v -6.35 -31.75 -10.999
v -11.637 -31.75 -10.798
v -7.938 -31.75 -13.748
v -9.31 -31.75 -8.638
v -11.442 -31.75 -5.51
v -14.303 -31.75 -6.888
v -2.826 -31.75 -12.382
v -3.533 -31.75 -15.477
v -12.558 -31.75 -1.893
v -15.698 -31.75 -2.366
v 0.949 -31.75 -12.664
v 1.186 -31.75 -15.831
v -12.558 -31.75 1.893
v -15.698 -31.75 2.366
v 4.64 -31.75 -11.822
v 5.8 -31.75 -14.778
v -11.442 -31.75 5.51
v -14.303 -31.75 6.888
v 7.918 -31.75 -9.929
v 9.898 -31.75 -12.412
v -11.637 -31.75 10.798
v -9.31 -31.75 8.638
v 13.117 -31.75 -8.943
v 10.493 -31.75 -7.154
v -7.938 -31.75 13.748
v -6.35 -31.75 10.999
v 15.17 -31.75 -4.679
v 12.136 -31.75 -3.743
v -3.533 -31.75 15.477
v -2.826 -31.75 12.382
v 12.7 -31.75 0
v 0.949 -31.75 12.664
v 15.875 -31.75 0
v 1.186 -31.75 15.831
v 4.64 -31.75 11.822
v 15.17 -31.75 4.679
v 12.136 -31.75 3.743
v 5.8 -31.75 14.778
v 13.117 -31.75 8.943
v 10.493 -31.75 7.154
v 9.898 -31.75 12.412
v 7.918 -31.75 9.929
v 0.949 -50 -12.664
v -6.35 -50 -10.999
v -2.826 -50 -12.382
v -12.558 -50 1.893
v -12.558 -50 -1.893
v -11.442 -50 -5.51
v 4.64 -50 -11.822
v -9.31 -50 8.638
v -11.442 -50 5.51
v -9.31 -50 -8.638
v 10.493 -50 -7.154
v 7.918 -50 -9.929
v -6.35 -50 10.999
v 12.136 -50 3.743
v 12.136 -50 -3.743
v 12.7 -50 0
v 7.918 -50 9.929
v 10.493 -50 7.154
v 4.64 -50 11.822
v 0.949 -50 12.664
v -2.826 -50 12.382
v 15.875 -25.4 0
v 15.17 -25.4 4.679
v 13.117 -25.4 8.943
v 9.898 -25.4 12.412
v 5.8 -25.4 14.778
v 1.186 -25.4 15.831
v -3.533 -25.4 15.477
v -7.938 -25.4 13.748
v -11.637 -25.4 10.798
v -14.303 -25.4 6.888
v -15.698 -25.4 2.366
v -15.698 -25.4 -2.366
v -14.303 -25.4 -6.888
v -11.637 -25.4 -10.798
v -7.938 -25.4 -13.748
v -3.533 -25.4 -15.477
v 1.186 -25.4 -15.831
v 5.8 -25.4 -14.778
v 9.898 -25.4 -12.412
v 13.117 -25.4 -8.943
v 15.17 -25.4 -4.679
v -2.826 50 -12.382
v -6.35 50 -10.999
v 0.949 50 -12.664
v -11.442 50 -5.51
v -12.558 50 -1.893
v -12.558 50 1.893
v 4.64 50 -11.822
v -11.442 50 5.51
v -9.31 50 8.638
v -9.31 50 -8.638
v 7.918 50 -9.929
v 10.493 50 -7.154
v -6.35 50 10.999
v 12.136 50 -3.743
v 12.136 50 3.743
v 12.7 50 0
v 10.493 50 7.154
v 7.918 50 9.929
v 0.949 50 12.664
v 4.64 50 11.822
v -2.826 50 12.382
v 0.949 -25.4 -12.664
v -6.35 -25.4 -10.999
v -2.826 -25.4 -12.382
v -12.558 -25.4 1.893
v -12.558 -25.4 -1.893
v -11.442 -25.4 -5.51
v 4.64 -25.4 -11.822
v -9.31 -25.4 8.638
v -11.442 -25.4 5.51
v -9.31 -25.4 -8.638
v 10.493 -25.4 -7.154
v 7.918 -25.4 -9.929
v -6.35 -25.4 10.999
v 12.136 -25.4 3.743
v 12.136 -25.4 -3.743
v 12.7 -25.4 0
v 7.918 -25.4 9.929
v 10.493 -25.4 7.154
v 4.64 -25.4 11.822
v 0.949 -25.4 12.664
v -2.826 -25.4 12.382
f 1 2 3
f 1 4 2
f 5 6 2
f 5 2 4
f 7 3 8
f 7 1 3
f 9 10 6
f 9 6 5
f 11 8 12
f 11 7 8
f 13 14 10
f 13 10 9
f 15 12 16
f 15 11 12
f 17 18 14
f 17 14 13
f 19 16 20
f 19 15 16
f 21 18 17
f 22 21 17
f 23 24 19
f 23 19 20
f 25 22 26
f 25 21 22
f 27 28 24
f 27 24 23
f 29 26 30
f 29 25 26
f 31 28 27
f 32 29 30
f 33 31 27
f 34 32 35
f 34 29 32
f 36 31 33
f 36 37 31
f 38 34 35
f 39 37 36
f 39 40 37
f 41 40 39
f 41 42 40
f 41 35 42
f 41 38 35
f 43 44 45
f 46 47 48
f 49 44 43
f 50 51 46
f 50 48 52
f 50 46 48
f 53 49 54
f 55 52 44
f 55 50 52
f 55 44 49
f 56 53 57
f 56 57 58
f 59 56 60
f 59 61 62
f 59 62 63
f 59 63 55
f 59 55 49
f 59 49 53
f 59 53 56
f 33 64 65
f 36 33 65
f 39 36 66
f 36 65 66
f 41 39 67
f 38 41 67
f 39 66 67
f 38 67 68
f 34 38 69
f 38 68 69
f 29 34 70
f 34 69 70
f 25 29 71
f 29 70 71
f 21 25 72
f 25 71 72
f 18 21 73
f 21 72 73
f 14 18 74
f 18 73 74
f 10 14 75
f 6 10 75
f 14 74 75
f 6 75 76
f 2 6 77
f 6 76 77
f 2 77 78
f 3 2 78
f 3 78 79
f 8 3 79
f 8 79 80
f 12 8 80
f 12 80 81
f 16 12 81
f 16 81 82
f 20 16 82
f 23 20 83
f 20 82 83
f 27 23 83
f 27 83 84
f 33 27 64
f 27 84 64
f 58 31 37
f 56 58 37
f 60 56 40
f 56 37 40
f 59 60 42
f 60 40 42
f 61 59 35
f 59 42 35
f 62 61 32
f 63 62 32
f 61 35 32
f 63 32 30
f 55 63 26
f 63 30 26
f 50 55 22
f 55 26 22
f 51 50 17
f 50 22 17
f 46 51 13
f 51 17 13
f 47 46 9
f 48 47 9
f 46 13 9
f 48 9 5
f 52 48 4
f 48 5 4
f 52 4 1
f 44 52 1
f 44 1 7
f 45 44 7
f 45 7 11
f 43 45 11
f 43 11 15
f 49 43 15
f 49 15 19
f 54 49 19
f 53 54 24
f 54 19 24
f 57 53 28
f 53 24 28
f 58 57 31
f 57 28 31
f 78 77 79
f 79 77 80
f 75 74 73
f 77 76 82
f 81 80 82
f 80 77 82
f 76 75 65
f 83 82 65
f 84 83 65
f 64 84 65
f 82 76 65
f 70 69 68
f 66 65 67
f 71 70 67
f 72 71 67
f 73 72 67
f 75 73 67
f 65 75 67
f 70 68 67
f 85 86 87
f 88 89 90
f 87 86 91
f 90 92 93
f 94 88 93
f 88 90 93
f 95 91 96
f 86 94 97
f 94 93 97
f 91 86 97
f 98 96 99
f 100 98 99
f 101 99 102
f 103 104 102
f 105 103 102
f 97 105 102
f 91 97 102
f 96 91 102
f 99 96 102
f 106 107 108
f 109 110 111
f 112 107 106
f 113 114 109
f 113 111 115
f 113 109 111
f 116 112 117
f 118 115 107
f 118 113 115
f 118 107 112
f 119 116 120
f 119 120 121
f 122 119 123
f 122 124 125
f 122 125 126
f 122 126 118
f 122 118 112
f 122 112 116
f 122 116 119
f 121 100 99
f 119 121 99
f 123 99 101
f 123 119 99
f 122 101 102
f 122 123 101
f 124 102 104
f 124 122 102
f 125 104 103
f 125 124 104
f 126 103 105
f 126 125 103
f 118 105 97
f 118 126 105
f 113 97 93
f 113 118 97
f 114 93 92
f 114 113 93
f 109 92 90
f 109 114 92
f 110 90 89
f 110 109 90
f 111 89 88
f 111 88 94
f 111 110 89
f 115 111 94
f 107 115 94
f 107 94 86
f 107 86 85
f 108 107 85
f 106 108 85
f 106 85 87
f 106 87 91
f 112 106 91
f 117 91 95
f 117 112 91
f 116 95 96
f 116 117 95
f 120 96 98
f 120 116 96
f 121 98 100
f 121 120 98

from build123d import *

# Parameters (mm, degrees)
F0_R     = 12.7
F1_DEPTH = 25.4
F2_R     = 15.875
F2_R_2   = 12.7
F3_DEPTH = 6.35
F4_R     = 12.7
F5_DEPTH = 18.2499
F6_DEPTH = 50


# Not quite as in the source:
# - a feature names something its author has since deleted; it is built from what else it names


with BuildPart() as f1:
    # F0 (on Front) → F1 (new body)
    with BuildSketch(Plane.XZ):
        Circle(F0_R)
    extrude(amount=F1_DEPTH)

    # F6 (add): a face of the model
    f6_faces = [f1.faces().sort_by_distance(p)[0] for p in [
        (0, 0, 0),
    ]]
    extrude(f6_faces, amount=F6_DEPTH)


with BuildPart() as f3:
    # F2 (on face) → F3 (new body)
    with BuildSketch(Plane.XZ.offset(25.4)):
        Circle(F2_R)
        Circle(F2_R_2, mode=Mode.SUBTRACT)
        Circle(F2_R_2)
    extrude(amount=F3_DEPTH)

    # F4 (on face) → F5 (join)
    with BuildSketch(Plane.XZ.offset(31.75)):
        Circle(F4_R)
    extrude(amount=F5_DEPTH)


solid = Compound([f1.part, f3.part])
